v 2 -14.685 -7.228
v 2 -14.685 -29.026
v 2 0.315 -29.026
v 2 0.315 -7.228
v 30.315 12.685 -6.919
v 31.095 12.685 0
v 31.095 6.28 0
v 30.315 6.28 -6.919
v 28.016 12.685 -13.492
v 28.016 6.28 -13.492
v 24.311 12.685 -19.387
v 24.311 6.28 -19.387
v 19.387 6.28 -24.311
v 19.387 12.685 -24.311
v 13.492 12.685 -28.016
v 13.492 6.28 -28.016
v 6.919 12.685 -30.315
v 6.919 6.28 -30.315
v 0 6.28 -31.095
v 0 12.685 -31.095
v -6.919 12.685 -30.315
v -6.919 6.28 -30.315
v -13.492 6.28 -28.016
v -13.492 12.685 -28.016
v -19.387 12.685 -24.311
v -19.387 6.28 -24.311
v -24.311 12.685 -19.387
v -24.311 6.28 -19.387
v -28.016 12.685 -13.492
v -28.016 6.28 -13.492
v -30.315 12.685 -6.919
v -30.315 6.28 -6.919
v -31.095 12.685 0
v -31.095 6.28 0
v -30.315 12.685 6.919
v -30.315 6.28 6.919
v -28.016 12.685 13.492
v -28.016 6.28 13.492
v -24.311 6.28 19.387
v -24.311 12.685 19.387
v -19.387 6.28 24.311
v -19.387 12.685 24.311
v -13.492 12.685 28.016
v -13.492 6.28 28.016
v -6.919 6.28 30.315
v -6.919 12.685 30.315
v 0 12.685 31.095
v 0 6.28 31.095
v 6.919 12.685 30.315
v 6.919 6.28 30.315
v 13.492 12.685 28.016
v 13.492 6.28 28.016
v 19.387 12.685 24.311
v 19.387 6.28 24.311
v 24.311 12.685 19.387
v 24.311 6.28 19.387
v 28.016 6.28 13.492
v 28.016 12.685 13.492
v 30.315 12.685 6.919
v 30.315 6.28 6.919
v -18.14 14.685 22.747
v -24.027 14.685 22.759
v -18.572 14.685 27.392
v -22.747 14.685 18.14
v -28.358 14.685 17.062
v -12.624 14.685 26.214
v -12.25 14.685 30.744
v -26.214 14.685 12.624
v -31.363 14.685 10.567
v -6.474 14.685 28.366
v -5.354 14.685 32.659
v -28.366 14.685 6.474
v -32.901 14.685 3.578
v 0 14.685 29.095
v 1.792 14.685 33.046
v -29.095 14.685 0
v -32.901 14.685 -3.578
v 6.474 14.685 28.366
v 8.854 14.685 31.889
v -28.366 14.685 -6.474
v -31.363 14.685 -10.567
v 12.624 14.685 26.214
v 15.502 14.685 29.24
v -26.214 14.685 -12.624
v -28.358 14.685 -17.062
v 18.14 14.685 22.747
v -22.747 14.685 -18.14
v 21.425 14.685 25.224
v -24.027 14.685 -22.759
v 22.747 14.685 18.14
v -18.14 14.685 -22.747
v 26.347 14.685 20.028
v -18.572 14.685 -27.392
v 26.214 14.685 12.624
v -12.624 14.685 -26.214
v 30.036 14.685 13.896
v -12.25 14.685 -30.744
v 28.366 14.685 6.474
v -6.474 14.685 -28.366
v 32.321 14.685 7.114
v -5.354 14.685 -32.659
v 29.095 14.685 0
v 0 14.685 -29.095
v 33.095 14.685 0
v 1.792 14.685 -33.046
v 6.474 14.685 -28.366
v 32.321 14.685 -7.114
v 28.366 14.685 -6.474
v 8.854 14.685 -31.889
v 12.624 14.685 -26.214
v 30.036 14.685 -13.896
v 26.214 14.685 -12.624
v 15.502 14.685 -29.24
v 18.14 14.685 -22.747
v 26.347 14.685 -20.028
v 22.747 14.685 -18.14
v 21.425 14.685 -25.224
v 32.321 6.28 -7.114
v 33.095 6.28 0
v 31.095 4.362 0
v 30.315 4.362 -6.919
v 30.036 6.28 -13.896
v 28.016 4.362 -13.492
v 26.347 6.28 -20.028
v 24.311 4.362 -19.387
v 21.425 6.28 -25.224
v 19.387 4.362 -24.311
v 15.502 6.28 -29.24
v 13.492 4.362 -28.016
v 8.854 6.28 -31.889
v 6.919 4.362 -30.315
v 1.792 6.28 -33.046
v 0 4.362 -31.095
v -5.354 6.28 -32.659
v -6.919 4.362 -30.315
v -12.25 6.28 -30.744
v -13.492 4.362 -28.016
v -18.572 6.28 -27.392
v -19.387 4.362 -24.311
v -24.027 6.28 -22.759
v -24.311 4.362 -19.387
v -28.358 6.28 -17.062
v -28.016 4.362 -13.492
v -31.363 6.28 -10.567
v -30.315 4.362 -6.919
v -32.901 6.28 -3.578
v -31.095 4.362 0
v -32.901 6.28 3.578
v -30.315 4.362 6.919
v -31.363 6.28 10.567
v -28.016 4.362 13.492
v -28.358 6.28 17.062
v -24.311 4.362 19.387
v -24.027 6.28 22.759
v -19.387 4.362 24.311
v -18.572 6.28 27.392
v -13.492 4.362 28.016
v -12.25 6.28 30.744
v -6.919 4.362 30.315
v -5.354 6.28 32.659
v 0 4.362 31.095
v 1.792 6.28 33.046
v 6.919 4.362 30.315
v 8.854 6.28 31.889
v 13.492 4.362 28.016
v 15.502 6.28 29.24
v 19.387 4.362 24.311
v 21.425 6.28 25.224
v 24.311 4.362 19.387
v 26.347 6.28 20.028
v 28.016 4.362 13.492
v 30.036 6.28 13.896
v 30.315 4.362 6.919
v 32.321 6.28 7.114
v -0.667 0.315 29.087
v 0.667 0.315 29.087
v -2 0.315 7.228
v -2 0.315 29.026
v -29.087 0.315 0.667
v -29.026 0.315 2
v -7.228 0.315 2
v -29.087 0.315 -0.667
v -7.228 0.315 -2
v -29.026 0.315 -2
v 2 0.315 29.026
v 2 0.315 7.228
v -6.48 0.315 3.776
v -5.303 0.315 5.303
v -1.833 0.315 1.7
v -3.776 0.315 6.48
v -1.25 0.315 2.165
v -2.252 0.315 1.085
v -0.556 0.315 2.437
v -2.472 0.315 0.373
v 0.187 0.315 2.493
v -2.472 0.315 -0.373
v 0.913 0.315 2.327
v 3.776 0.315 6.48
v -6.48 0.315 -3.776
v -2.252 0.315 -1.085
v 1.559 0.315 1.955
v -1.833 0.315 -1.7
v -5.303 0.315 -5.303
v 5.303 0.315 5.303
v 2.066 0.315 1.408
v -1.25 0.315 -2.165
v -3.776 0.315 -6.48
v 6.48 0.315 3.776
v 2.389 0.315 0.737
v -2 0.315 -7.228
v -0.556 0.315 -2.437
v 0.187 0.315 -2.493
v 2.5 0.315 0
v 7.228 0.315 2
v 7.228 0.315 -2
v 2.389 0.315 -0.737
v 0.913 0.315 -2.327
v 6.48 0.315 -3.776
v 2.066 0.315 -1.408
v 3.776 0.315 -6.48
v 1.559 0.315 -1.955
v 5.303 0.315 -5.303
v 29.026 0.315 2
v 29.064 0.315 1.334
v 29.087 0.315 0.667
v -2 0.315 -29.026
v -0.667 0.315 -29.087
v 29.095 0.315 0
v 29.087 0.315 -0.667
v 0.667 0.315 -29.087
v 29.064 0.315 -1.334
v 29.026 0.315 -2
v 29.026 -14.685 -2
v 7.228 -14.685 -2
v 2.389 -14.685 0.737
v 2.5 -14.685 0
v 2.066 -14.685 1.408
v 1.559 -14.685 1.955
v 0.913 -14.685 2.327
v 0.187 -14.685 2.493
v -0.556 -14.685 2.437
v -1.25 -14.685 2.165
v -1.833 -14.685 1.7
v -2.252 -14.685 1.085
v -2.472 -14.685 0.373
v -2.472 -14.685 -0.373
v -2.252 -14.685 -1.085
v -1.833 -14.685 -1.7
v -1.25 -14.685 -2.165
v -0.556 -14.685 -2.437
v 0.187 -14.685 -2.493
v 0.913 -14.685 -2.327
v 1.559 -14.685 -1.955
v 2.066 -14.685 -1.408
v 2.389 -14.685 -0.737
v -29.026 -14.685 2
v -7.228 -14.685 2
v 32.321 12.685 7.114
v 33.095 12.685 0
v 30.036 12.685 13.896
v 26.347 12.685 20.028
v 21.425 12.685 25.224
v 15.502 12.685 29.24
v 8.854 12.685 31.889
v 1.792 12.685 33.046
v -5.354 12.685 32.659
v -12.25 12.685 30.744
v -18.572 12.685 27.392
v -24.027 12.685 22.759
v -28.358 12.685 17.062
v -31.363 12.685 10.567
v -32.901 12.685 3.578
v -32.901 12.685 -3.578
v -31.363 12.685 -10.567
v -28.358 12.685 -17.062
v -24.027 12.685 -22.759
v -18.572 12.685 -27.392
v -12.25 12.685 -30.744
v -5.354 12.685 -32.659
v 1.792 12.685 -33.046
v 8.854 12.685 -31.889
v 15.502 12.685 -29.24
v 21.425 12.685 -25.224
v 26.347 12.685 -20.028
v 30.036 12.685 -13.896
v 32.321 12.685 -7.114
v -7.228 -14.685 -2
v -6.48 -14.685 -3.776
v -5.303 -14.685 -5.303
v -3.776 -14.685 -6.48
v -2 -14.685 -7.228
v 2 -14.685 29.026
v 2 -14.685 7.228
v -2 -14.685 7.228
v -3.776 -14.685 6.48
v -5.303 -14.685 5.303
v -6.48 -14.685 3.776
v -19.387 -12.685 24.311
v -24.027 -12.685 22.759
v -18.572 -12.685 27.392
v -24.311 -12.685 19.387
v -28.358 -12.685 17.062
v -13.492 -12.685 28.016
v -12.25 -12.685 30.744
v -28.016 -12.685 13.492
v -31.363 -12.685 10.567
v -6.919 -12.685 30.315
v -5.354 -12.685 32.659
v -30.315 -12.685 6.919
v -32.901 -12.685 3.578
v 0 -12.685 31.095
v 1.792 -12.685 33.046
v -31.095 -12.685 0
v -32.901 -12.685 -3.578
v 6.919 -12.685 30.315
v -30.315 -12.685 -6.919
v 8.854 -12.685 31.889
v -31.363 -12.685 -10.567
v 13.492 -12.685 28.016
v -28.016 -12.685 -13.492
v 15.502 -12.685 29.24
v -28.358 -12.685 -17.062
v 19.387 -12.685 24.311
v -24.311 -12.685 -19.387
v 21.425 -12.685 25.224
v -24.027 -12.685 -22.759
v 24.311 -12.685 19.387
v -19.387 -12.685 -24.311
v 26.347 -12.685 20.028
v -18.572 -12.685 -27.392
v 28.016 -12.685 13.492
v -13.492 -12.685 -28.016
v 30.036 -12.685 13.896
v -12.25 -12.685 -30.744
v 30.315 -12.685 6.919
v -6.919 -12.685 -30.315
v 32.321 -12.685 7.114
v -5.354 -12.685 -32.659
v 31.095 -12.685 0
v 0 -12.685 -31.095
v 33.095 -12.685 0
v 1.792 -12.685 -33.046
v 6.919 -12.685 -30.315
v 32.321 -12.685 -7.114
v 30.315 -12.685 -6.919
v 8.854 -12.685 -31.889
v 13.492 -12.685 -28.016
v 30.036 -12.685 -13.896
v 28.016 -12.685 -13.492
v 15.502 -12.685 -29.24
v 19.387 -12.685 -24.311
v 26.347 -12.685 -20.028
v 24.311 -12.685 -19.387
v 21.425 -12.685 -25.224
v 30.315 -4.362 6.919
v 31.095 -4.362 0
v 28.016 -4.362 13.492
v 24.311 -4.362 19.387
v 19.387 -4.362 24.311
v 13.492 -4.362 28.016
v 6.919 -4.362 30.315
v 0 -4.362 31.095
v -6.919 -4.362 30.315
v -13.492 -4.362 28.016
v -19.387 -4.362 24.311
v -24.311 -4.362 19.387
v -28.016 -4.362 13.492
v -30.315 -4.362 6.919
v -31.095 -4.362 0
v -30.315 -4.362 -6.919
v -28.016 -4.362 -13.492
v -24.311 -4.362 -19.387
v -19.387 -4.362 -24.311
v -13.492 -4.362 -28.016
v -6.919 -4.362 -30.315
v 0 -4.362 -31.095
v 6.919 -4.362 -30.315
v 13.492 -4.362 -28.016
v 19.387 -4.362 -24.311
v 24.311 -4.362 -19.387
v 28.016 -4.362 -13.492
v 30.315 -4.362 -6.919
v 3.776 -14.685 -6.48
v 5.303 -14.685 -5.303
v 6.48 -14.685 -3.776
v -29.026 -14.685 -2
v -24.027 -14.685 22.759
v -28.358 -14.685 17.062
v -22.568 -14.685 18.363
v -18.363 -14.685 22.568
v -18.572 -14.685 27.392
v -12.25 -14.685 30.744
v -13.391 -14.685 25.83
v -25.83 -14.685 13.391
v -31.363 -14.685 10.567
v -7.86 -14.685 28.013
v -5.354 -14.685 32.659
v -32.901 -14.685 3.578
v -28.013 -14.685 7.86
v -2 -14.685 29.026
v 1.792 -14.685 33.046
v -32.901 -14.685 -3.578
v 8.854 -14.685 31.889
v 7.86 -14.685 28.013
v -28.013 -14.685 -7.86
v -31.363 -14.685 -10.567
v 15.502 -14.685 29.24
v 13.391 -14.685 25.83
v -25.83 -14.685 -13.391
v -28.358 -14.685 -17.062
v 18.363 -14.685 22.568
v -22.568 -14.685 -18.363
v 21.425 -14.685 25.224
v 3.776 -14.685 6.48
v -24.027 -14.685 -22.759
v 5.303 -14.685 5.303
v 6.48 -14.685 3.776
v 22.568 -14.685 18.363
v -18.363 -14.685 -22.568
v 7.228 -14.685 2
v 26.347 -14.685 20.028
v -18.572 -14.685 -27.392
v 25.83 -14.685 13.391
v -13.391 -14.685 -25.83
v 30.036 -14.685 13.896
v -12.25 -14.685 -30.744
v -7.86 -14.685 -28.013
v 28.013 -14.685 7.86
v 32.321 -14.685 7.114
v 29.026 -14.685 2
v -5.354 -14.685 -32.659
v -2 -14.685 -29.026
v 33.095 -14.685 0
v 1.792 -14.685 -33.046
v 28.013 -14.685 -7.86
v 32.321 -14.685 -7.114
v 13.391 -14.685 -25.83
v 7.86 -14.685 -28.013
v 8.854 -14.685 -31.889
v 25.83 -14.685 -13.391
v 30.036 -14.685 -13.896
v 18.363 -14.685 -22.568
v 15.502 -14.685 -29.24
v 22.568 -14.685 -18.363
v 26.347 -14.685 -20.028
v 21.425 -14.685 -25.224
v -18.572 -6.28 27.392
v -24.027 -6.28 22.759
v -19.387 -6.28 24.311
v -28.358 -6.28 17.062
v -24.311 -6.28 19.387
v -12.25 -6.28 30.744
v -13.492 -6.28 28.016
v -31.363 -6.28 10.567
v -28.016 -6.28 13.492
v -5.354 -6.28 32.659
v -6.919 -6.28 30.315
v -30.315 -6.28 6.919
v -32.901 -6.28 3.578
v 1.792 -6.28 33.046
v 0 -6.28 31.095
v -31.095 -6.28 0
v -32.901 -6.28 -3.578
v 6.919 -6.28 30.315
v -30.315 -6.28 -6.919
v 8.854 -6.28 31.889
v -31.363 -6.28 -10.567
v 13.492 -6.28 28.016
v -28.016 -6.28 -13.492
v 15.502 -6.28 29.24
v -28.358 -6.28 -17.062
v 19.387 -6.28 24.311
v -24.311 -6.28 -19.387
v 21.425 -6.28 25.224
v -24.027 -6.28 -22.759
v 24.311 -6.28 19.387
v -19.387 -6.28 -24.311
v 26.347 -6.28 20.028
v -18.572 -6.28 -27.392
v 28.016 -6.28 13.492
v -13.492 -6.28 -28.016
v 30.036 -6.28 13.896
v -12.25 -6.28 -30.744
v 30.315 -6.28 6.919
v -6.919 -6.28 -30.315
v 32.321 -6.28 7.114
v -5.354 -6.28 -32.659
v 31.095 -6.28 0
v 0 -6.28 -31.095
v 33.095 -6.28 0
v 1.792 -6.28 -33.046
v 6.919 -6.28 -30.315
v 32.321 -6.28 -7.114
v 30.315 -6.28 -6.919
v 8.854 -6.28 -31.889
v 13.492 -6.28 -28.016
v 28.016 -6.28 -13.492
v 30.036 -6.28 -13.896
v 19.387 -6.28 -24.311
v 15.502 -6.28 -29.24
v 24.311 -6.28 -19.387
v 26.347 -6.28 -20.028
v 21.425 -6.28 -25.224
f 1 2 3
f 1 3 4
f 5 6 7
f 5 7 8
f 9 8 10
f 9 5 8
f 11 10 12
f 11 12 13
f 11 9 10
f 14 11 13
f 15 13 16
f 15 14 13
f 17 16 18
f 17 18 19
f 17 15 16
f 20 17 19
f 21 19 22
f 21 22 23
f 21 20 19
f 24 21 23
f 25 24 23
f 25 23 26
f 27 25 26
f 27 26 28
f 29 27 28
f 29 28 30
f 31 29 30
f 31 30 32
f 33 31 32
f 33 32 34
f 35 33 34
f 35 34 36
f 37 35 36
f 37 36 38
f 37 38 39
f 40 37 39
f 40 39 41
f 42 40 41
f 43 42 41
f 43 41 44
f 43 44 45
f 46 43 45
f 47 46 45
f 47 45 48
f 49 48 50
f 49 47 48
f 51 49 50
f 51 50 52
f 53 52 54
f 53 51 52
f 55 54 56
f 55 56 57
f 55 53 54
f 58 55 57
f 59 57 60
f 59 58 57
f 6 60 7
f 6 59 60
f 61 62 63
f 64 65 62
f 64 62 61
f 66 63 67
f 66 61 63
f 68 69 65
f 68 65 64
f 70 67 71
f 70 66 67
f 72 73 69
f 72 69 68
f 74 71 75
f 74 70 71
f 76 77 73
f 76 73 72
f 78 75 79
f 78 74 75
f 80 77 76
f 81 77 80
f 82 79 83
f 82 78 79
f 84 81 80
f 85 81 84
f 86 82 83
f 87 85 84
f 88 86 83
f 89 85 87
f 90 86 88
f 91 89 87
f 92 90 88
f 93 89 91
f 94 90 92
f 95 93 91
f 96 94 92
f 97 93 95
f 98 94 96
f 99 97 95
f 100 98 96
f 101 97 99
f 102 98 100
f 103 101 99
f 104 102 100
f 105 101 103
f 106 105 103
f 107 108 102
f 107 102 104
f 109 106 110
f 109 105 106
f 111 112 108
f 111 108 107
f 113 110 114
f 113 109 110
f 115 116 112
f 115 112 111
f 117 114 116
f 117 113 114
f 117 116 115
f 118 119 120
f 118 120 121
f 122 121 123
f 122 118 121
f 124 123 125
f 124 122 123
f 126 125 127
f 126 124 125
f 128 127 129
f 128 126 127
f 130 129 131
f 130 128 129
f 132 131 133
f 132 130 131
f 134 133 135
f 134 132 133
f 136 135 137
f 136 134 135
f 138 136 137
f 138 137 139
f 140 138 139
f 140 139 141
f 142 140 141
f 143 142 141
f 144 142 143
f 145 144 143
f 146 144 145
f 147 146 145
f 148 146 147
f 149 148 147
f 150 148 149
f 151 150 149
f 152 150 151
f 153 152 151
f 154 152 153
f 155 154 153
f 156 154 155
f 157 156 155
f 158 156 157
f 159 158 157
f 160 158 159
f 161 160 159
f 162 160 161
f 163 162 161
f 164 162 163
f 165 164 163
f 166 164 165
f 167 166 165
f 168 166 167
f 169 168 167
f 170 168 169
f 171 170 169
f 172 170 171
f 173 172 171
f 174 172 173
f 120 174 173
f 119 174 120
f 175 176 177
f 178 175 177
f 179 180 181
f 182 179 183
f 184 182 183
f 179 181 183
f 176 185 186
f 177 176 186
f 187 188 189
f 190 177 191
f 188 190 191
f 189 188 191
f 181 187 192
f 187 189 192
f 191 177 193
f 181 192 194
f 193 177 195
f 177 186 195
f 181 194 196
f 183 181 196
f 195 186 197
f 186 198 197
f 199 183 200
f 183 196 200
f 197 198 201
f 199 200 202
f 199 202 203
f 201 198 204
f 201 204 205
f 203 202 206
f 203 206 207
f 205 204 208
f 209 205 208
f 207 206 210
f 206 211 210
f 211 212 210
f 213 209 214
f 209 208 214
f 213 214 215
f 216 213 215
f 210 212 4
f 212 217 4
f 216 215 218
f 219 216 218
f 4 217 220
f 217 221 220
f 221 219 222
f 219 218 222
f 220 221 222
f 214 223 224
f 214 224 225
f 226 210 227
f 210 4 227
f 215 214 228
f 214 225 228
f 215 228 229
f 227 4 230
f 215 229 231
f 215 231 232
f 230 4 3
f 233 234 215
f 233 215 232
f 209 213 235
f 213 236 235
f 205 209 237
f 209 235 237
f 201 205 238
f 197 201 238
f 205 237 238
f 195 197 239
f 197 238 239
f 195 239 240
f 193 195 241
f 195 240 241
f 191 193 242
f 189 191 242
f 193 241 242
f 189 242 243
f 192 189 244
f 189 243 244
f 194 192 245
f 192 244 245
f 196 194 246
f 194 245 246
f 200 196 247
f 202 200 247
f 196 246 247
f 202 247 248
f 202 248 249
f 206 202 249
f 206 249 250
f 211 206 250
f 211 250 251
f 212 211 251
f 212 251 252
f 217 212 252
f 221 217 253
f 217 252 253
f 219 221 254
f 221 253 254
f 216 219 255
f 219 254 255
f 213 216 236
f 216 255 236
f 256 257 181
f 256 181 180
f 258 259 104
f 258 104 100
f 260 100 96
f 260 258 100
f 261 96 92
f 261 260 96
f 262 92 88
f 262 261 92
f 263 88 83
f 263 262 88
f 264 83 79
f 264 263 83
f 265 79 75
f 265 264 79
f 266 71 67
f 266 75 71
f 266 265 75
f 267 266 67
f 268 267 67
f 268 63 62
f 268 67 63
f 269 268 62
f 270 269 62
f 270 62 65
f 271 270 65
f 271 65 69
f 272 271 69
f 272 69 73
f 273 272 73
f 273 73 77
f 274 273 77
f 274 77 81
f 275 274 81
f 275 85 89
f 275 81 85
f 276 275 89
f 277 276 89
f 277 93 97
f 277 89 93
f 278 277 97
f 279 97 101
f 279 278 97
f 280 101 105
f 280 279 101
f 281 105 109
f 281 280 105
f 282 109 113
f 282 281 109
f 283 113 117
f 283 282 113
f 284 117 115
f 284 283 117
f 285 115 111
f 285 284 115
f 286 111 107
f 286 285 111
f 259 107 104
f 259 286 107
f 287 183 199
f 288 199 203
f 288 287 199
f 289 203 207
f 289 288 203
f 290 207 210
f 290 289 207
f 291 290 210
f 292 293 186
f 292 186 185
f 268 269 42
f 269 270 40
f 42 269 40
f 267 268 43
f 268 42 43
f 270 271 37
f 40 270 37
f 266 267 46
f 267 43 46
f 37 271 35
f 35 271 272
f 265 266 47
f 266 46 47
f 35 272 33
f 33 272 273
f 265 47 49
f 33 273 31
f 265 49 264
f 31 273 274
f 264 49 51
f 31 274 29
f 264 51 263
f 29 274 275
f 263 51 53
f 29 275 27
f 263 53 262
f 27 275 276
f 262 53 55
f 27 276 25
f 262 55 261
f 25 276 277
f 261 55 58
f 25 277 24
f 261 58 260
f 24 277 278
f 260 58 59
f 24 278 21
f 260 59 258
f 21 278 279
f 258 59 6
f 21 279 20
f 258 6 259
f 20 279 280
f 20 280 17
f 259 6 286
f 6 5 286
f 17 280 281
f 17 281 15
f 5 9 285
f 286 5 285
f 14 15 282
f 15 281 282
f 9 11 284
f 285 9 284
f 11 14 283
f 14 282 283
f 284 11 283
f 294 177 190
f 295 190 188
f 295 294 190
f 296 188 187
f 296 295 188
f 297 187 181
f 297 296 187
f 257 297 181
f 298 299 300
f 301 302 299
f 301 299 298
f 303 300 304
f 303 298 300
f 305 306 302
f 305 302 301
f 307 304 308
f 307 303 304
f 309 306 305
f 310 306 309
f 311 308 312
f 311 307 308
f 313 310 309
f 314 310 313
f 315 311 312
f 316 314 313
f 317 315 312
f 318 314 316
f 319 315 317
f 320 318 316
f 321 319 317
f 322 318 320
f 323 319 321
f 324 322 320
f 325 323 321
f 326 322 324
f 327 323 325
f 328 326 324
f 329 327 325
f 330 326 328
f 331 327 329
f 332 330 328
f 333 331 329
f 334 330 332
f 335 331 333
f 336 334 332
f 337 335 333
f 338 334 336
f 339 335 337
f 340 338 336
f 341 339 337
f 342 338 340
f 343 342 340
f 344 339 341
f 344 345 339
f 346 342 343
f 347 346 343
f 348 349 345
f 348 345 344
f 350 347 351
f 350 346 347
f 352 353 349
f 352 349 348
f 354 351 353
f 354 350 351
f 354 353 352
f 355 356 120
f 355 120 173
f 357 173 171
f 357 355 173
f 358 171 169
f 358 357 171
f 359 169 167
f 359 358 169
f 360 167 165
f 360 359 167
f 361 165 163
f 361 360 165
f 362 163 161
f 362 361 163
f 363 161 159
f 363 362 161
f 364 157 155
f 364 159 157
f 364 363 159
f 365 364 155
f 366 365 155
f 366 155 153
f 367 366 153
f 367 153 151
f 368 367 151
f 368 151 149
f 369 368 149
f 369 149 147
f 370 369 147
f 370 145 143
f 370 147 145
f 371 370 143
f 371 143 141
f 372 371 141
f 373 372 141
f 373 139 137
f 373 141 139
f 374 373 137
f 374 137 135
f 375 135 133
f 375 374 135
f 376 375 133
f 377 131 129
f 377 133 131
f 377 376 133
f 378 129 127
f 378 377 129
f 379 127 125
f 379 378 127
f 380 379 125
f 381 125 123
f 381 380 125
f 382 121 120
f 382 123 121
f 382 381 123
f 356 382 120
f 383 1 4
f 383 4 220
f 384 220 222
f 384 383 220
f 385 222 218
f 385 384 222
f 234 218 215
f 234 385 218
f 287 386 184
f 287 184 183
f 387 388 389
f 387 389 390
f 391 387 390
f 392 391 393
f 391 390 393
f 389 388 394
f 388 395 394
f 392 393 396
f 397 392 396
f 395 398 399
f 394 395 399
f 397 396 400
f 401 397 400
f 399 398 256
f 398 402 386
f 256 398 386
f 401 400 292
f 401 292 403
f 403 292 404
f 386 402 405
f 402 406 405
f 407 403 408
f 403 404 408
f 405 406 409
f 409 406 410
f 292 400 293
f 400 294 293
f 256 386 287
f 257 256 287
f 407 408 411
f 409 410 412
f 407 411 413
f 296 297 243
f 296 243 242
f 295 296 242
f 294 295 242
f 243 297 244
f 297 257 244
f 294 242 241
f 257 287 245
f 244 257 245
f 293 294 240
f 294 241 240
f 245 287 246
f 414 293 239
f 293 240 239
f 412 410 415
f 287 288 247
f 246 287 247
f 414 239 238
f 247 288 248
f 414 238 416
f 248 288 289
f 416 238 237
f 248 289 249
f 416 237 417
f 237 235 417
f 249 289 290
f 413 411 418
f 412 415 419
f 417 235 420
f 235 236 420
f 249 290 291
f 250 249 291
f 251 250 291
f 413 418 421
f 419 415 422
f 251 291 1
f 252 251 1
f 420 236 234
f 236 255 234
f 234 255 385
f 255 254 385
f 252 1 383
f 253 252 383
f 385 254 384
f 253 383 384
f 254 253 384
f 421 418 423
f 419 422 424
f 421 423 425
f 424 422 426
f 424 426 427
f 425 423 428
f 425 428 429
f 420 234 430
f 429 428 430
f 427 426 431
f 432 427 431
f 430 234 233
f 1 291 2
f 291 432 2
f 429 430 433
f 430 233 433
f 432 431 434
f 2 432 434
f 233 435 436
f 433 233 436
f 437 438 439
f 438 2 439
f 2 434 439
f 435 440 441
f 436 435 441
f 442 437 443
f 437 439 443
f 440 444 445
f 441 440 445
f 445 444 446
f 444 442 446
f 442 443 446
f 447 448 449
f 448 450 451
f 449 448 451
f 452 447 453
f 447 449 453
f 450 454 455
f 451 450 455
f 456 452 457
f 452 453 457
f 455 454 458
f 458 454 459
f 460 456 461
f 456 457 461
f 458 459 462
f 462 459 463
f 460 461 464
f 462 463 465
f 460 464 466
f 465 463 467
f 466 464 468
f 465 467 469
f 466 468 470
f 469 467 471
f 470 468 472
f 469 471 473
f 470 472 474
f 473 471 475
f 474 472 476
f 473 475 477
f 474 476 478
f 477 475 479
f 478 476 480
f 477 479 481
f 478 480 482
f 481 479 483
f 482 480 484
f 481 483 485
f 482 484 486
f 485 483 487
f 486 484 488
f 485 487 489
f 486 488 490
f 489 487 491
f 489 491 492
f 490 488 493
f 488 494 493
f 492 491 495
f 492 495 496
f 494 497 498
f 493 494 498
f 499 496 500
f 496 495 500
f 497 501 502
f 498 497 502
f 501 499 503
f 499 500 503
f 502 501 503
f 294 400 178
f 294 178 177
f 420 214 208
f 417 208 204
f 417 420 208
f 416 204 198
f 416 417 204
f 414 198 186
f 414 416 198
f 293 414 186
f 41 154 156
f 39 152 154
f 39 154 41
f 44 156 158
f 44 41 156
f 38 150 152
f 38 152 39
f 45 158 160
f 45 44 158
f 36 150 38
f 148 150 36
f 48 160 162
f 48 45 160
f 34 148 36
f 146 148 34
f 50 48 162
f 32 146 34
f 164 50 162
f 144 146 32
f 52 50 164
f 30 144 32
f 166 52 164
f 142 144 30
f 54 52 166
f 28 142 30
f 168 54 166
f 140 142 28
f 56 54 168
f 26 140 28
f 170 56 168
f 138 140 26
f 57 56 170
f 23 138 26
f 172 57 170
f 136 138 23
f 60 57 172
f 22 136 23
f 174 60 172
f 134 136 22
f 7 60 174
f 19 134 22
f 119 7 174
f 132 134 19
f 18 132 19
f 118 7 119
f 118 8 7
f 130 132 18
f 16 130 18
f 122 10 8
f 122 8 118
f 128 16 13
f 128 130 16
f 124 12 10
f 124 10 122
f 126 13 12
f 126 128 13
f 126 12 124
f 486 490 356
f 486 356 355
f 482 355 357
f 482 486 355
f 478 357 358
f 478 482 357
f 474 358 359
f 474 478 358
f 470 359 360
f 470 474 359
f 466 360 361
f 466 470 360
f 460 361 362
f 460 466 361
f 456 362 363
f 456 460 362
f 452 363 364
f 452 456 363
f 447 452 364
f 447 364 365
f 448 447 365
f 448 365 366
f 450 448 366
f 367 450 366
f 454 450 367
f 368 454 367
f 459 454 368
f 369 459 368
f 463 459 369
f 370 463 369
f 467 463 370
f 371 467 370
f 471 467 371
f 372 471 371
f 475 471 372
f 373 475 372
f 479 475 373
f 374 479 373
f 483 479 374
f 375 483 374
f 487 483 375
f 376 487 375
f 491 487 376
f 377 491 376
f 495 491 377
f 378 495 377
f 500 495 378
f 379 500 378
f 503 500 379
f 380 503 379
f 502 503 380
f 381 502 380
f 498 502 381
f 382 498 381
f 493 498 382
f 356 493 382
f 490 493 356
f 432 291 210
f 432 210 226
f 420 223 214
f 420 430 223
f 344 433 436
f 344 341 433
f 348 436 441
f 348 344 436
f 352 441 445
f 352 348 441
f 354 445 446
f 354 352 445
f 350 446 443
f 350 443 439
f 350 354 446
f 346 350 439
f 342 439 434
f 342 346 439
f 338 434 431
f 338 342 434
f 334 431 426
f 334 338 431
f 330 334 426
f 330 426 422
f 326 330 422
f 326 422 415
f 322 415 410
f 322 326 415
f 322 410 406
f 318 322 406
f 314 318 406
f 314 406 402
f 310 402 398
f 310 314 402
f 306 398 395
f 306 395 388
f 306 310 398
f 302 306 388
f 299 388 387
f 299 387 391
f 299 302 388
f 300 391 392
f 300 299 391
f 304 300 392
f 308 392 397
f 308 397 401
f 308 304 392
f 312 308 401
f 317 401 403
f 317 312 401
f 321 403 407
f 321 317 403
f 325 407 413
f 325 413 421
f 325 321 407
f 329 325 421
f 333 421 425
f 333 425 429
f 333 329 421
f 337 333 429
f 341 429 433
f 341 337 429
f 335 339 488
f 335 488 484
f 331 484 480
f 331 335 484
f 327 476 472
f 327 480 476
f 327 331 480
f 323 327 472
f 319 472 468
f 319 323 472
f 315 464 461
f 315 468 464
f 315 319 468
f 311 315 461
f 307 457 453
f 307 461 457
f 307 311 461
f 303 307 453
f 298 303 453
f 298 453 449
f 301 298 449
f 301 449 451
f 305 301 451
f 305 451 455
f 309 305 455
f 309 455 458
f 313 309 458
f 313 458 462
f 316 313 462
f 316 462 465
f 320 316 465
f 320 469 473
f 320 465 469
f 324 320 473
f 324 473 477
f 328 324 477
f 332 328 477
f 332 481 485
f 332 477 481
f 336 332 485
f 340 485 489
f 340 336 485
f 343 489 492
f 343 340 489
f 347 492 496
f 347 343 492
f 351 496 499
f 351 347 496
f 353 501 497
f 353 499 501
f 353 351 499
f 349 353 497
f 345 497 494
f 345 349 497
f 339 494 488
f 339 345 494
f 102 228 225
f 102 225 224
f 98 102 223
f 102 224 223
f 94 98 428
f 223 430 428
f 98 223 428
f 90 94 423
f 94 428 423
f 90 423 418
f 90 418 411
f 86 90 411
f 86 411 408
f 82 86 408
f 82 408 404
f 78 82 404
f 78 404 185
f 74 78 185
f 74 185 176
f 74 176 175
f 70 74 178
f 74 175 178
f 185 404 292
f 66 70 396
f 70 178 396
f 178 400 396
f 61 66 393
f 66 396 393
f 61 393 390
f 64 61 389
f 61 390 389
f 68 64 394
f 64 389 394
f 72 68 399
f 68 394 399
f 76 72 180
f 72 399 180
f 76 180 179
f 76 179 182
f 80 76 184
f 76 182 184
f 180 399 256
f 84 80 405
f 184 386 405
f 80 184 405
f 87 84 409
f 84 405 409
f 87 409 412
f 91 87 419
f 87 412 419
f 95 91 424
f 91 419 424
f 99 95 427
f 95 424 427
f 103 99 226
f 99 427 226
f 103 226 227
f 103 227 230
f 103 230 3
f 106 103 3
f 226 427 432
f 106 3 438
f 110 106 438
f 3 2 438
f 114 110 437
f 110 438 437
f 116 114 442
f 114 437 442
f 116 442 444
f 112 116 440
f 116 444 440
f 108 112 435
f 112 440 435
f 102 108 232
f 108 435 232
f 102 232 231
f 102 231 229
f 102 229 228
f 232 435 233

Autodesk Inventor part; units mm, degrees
ref_plane "YZ Plane" through (0, 0, 0) normal (1, 0, 0) x (0, 1, 0)
ref_plane "XZ Plane" through (0, 0, 0) normal (0, 1, 0) x (-1, 0, 0)
ref_plane "XY Plane" through (0, 0, 0) normal (0, 0, 1) x (1, 0, 0)
sketch "Sketch1" plane through (0, 0, 0) normal (0, 0, 1) x (1, 0, 0)
  line L0 (0, 0) -> (31.095, 0)
  line L1 (31.095, 0) -> (31.095, 14.685)
  line L2 (31.095, 14.685) -> (33.095, 14.685)
  line L3 (33.095, 14.685) -> (33.095, 12.685)
  line L4 (33.095, 12.685) -> (31.095, 12.685)
  line L5 (31.095, 0) -> (31.095, 6.28)
  line L6 (31.095, 6.28) -> (33.095, 6.28)
  line L7 (33.095, 6.28) -> (31.095, 4.3618)
  line L8 (31.095, -14.685) -> (33.095, -14.685)
  line L9 (33.095, -14.685) -> (33.095, -12.685)
  line L10 (33.095, -12.685) -> (31.095, -12.685)
  line L11 (31.095, -6.28) -> (33.095, -6.28)
  line L12 (33.095, -6.28) -> (31.095, -4.3618)
  line L13 (31.095, 14.685) -> (29.095, 14.685)
  line L14 (29.095, 14.685) -> (29.095, -14.685)
  line L15 (29.095, -14.685) -> (31.095, -14.685)
  line L16 (33.095, -6.28) -> (31.095, -4.3618)
  line L17 (31.095, 0) -> (31.095, -4.3618)
  line L18 (31.095, -6.28) -> (31.095, -14.685)
  line L19 (0, -20.559) -> (0, 20.559) projected
  dimension "d0" = 31.095
  dimension "d1" = 14.685
  dimension "d2" = 2
  dimension "d3" = 2
  dimension "d4" = 6.28
  dimension "d5" = 2
  dimension "d6" = 2
revolve "Revolution1" add sketch "Sketch1" angle 360 about axis through (0, -10, 0) along (0, 1, 0)
sketch "Sketch2" plane through (0, -14.685, 0) normal (0, -1, 0) x (1, 0, 0)
  circle A0 centre (0, 0) radius 29.095
  line L0 (0, 0) -> (-2, 0)
  line L1 (-2, 0) -> (2, 0)
  line L2 (-2, 0) -> (2, 0)
  line L3 (2, 0) -> (2, 29.0262)
  line L4 (-2, 29.0262) -> (-2, 0)
  circle A1 centre (0, 0) radius 7.5
  dimension "d8" = 2
  dimension "d9" = 4
  dimension "d10" = 15
extrude "Extrusion1" add sketch "Sketch2" against normal blind 15 contours L3 A1 L4 A0 | A1 L4 L0 L1 L3 | L3 L1 L0 L4 A1 picked at (-0.2224, 14.6756)
pattern_circular "Circular Pattern1" count 4 over 360 about axis through (0, -14.685, 0) along (0, 1, 0) of "Extrusion1"
sketch "Sketch3" plane through (0, -14.685, 0) normal (0, -1, 0) x (1, 0, 0)
  circle A0 centre (0, 0) radius 2.5
  dimension "d16" = 5
extrude "Extrusion2" cut sketch "Sketch3" against normal blind 15
properties part number "OSV Specific Wheel #2"
